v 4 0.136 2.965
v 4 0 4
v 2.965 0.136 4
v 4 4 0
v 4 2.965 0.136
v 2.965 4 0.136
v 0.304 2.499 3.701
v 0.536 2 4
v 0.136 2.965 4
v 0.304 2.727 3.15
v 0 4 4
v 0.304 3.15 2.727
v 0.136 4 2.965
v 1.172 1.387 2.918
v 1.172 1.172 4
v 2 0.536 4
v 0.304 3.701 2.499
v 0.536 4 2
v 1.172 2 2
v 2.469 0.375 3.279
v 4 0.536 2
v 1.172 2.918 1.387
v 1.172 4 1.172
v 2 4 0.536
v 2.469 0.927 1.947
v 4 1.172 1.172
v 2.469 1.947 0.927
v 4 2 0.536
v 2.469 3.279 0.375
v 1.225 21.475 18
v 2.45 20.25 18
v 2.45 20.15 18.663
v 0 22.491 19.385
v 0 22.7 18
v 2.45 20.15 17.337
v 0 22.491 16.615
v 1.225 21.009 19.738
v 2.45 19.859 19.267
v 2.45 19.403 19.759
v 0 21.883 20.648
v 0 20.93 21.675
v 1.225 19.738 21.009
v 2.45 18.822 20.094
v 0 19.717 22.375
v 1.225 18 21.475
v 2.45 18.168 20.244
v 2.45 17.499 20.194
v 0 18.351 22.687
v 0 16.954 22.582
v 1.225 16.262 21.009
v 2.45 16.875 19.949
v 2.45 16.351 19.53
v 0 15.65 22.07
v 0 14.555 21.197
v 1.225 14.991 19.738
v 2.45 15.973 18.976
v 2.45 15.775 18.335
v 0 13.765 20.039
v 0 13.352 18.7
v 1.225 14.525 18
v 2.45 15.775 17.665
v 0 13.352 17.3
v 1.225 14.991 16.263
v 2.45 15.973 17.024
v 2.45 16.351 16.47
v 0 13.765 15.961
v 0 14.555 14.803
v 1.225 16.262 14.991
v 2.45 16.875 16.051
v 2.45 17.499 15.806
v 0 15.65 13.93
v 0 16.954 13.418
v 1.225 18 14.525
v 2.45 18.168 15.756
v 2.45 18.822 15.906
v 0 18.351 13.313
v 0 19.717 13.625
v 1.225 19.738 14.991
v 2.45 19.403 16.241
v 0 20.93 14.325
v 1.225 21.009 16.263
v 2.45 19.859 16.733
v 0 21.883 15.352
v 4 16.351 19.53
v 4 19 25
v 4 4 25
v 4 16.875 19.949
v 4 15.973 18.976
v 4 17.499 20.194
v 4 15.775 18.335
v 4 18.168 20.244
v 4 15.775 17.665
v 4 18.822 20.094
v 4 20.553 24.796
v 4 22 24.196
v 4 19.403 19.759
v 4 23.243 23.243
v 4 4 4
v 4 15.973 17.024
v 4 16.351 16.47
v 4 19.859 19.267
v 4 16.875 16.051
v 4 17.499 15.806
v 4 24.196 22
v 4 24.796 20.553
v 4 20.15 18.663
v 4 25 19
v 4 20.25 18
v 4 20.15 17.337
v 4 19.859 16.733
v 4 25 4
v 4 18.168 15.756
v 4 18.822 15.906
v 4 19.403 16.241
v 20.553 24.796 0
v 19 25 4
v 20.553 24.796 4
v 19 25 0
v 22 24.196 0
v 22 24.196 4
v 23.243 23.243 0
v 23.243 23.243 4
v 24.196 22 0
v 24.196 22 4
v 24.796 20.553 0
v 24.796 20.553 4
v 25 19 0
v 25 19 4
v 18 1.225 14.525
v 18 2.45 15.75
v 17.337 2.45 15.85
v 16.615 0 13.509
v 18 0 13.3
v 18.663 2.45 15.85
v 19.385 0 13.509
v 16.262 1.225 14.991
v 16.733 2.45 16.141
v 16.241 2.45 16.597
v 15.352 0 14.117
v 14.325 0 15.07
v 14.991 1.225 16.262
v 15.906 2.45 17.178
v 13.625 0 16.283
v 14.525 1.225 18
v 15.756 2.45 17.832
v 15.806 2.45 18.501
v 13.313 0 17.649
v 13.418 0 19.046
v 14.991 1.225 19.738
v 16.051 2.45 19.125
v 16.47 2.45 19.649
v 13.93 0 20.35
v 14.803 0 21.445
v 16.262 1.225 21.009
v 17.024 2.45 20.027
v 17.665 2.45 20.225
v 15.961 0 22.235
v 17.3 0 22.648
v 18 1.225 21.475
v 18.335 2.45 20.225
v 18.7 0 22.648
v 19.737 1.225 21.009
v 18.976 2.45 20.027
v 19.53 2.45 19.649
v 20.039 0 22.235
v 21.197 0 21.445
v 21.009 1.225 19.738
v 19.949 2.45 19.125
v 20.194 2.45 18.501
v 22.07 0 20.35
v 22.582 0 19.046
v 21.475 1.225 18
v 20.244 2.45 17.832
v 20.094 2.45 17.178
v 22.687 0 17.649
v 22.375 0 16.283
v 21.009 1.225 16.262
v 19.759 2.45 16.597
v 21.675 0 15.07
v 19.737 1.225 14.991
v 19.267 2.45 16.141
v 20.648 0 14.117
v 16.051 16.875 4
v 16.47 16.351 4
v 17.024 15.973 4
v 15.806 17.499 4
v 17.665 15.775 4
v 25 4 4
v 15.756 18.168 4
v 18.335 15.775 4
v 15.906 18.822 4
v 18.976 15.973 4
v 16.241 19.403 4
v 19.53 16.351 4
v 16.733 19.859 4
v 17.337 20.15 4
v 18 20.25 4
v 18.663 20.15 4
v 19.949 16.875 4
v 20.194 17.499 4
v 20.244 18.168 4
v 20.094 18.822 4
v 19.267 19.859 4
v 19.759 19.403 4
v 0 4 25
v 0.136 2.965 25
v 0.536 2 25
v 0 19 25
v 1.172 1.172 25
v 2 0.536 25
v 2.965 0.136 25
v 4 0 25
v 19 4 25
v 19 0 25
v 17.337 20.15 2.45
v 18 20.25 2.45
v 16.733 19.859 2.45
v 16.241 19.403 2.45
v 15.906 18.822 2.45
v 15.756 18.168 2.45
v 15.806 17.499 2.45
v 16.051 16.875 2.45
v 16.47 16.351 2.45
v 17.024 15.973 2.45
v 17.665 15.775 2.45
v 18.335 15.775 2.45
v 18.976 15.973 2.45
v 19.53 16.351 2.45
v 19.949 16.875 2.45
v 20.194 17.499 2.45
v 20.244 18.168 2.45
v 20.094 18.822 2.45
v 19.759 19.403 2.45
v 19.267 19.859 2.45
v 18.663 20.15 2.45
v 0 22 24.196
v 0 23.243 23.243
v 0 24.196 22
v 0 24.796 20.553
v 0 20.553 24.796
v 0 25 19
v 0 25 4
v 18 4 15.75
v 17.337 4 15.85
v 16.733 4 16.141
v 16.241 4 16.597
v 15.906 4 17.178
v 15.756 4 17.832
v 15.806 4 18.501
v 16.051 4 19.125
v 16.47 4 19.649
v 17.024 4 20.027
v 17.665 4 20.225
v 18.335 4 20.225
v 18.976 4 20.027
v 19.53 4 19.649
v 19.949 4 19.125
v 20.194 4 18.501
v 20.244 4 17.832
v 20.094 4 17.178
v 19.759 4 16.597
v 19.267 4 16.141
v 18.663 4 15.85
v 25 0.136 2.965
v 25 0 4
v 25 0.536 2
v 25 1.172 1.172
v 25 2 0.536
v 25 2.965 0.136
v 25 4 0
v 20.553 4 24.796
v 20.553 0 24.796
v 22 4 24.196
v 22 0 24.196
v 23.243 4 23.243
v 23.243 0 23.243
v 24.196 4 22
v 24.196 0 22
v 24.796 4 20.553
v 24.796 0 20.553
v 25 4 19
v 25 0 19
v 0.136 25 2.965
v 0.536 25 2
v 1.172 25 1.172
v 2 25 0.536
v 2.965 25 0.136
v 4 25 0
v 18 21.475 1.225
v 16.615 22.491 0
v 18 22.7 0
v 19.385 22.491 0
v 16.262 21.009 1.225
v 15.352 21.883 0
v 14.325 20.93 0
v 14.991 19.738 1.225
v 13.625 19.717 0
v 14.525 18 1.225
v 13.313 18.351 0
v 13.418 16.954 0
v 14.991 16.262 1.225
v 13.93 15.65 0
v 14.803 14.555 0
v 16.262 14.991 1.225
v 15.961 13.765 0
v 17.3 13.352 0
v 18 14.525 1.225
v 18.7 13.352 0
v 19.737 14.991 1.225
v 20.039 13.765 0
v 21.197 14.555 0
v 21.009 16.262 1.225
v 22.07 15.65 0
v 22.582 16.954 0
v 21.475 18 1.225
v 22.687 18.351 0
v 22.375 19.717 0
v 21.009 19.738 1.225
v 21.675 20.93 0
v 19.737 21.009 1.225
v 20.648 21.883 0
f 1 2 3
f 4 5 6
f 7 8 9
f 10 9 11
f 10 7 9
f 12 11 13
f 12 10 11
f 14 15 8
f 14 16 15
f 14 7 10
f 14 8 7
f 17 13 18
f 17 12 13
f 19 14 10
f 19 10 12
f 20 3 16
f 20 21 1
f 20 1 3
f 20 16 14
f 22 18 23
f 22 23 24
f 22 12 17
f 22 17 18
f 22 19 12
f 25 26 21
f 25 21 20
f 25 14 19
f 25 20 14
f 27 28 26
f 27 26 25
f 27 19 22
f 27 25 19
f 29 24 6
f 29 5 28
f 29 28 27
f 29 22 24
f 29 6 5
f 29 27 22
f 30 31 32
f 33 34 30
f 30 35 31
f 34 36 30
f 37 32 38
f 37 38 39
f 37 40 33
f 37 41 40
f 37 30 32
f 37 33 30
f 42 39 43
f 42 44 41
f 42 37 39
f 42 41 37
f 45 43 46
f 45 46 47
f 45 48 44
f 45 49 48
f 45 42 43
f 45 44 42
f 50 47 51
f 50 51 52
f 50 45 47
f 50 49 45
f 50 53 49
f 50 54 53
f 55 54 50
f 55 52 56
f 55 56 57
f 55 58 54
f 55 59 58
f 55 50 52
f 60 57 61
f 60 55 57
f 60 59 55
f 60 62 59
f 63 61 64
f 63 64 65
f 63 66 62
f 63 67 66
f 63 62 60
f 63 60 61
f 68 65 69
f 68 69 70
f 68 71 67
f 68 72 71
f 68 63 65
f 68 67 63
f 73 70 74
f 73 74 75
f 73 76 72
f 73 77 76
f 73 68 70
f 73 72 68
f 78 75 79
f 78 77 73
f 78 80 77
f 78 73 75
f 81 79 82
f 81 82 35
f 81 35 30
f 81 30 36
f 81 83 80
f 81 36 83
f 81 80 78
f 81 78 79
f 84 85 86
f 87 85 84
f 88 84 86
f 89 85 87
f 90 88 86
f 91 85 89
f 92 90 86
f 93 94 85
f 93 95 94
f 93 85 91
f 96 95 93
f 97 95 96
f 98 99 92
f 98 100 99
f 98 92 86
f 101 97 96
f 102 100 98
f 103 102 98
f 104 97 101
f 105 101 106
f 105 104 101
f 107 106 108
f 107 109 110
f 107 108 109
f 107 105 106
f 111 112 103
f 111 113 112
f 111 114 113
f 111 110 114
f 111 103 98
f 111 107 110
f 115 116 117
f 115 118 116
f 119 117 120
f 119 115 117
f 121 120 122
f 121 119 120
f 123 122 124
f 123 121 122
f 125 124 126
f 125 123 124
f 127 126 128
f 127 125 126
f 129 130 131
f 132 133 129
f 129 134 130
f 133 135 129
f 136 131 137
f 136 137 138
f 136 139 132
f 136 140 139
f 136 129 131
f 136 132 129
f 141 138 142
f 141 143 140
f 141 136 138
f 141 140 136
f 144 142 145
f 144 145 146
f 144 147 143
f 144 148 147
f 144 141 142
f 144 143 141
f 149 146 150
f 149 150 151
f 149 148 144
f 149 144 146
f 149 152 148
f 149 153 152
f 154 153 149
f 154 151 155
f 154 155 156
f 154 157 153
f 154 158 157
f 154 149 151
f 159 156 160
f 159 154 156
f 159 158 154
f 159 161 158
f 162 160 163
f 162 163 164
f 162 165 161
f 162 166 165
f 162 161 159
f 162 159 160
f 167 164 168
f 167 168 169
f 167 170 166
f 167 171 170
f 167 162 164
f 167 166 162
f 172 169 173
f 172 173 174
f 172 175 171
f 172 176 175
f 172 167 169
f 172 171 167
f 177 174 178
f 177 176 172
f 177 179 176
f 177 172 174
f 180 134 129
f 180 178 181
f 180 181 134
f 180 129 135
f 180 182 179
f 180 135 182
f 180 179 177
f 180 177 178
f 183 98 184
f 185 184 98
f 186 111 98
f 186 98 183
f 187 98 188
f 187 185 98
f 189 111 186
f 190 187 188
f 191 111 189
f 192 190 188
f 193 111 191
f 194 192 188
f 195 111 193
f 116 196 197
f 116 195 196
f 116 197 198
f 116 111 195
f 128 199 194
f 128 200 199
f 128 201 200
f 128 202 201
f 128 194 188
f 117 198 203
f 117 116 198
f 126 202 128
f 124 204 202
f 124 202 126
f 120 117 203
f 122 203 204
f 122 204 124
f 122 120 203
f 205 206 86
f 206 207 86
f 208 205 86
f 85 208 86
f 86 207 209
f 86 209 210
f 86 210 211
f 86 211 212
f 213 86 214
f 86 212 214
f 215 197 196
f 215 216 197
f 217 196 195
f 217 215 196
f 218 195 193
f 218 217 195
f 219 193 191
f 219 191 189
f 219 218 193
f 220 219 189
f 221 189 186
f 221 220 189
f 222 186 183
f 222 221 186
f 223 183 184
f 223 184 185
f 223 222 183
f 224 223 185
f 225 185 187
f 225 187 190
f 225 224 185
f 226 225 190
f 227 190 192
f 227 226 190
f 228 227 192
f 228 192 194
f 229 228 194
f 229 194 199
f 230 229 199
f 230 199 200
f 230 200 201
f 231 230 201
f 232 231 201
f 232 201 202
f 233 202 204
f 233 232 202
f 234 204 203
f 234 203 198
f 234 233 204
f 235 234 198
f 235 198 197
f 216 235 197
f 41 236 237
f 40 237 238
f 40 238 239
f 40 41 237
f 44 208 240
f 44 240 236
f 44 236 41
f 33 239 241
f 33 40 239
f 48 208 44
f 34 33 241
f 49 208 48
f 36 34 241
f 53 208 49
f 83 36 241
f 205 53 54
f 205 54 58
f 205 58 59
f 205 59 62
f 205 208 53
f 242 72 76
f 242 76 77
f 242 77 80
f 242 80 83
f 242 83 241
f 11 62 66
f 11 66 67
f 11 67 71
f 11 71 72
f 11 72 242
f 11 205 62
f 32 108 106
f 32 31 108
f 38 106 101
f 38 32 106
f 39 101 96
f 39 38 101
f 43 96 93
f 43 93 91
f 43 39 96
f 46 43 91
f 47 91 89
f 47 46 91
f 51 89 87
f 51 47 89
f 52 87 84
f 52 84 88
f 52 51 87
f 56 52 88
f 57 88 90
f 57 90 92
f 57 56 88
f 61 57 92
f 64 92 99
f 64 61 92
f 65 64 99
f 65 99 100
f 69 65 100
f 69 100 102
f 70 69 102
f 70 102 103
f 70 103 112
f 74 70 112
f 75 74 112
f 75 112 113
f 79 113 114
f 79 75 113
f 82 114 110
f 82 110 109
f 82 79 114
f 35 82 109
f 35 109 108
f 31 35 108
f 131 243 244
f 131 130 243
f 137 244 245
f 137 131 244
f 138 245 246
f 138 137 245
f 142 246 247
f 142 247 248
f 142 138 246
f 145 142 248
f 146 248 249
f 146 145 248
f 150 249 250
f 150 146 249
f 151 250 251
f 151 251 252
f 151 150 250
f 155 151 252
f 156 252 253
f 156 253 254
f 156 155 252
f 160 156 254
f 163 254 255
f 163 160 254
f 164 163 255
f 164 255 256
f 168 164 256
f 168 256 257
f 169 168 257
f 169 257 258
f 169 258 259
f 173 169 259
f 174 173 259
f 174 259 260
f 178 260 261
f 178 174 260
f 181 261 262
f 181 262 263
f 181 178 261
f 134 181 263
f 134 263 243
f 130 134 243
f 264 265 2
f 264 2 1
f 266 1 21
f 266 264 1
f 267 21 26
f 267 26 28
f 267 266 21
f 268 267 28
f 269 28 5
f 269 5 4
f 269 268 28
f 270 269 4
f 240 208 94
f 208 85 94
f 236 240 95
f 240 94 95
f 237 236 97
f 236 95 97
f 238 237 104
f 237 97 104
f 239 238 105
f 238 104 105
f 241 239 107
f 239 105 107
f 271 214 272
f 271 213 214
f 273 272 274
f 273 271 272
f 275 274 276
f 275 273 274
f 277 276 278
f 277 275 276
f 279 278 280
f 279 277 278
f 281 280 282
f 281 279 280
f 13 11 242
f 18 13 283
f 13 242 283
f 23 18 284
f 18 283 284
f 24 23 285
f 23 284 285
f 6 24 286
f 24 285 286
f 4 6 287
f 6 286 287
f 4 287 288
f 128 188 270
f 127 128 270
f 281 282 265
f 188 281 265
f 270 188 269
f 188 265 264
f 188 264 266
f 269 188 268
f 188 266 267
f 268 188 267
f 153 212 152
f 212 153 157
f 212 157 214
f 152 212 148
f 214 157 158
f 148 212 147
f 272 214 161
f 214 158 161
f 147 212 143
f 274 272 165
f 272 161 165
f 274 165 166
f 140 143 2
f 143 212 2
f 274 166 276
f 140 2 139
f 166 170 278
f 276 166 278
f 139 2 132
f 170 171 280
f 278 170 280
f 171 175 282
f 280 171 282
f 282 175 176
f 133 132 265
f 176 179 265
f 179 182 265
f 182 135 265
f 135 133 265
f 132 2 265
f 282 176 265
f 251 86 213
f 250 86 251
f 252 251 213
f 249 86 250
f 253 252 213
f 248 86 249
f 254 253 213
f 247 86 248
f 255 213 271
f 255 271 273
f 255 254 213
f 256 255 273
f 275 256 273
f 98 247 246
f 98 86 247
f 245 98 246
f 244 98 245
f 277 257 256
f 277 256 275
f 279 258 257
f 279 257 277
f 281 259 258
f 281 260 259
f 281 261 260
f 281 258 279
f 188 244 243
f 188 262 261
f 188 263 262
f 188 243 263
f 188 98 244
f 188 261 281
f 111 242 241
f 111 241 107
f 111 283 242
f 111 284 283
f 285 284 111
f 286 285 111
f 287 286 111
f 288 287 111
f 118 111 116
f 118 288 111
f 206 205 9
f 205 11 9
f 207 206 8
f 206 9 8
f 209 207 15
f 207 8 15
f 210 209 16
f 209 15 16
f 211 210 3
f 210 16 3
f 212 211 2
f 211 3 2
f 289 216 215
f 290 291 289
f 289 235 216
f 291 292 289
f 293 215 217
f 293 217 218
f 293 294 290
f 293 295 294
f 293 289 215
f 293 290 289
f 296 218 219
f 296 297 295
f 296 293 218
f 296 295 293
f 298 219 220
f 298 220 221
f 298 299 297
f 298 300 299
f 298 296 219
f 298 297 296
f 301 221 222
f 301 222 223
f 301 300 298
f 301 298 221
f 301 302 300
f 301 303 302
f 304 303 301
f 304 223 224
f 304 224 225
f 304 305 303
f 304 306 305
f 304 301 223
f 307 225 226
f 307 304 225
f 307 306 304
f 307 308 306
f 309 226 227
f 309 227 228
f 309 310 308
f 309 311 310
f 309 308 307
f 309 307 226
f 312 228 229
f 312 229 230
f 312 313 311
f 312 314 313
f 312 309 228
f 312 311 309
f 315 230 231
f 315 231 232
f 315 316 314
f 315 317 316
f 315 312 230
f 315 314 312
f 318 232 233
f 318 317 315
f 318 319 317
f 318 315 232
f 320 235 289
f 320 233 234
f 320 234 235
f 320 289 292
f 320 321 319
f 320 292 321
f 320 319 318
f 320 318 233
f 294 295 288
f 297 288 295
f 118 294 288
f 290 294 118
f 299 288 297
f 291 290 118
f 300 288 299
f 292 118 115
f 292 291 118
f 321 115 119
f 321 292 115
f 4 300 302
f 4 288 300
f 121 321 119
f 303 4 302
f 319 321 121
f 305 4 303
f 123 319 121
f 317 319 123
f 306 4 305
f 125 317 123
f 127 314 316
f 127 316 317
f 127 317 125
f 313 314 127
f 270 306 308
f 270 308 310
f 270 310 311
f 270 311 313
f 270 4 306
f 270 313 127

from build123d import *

# Parameters (mm, degrees)
SKETCH1_W           = 25
SKETCH1_H           = 25
BOSS_EXTRUDE1_DEPTH = 25
SKETCH2_W           = 21
SKETCH2_H           = 21
CUT_EXTRUDE1_DEPTH  = 21
FILLET1_R           = 6
FILLET2_R           = 4


with BuildPart() as part:
    # Sketch1 → Boss-Extrude1 (new body)
    with BuildSketch(Plane(origin=(0, 0, 0), x_dir=(1, 0, 0), z_dir=(0, 1, 0))):
        with Locations((12.5, -12.5)):
            Rectangle(SKETCH1_W, SKETCH1_H)
    extrude(amount=BOSS_EXTRUDE1_DEPTH)

    # Sketch2 → Cut-Extrude1 (cut)
    with BuildSketch(Plane(origin=(0, 25, 0), x_dir=(1, 0, 0), z_dir=(0, 1, 0))):
        with Locations((14.5, -14.5)):
            Rectangle(SKETCH2_W, SKETCH2_H)
    extrude(amount=-CUT_EXTRUDE1_DEPTH, mode=Mode.SUBTRACT)

    # Fillet1
    fillet1_edges = [part.edges().sort_by_distance(p)[0] for p in [
        (25, 25, 2),
        (25, 2, 25),
        (2, 25, 25),
    ]]
    fillet(fillet1_edges, radius=FILLET1_R)

    # Sketch4 → CSK for M4 Countersunk Flat Head Screw2 (revolve, cut)
    with BuildSketch(Plane(origin=(18, 18, 0), x_dir=(0, 1, 0), z_dir=(1, 0, 0))):
        Polygon((0, 0), (0, 4), (2.25, 4), (2.25, 2.45), (4.7, 0), align=None)
    revolve(axis=Axis((18, 18, -6.35), (0, 0, 1)), mode=Mode.SUBTRACT)

    # Sketch4 at point 2 (carried to point 2, square into its face) → CSK for M4 Countersunk Flat Head Scr 2 (revolve, cut)
    with BuildSketch(Plane(origin=(0, 18, 18), x_dir=(0, 1, 0), z_dir=(0, 0, -1))):
        Polygon((0, 0), (0, 4), (2.25, 4), (2.25, 2.45), (4.7, 0), align=None)
    revolve(axis=Axis((-6.35, 18, 18), (1, 0, 0)), mode=Mode.SUBTRACT)

    # Sketch4 at point 3 (carried to point 3, square into its face) → CSK for M4 Countersunk Flat Head Scr 3 (revolve, cut)
    with BuildSketch(Plane(origin=(18, 0, 18), x_dir=(0, 0, -1), z_dir=(1, 0, 0))):
        Polygon((0, 0), (0, 4), (2.25, 4), (2.25, 2.45), (4.7, 0), align=None)
    revolve(axis=Axis((18, -6.35, 18), (0, 1, 0)), mode=Mode.SUBTRACT)

    # Fillet2
    fillet2_edges = [part.edges().sort_by_distance(p)[0] for p in [
        (12.5, 0, 0),
        (0, 0, 12.5),
        (0, 12.5, 0),
    ]]
    fillet(fillet2_edges, radius=FILLET2_R)


solid = part.part
